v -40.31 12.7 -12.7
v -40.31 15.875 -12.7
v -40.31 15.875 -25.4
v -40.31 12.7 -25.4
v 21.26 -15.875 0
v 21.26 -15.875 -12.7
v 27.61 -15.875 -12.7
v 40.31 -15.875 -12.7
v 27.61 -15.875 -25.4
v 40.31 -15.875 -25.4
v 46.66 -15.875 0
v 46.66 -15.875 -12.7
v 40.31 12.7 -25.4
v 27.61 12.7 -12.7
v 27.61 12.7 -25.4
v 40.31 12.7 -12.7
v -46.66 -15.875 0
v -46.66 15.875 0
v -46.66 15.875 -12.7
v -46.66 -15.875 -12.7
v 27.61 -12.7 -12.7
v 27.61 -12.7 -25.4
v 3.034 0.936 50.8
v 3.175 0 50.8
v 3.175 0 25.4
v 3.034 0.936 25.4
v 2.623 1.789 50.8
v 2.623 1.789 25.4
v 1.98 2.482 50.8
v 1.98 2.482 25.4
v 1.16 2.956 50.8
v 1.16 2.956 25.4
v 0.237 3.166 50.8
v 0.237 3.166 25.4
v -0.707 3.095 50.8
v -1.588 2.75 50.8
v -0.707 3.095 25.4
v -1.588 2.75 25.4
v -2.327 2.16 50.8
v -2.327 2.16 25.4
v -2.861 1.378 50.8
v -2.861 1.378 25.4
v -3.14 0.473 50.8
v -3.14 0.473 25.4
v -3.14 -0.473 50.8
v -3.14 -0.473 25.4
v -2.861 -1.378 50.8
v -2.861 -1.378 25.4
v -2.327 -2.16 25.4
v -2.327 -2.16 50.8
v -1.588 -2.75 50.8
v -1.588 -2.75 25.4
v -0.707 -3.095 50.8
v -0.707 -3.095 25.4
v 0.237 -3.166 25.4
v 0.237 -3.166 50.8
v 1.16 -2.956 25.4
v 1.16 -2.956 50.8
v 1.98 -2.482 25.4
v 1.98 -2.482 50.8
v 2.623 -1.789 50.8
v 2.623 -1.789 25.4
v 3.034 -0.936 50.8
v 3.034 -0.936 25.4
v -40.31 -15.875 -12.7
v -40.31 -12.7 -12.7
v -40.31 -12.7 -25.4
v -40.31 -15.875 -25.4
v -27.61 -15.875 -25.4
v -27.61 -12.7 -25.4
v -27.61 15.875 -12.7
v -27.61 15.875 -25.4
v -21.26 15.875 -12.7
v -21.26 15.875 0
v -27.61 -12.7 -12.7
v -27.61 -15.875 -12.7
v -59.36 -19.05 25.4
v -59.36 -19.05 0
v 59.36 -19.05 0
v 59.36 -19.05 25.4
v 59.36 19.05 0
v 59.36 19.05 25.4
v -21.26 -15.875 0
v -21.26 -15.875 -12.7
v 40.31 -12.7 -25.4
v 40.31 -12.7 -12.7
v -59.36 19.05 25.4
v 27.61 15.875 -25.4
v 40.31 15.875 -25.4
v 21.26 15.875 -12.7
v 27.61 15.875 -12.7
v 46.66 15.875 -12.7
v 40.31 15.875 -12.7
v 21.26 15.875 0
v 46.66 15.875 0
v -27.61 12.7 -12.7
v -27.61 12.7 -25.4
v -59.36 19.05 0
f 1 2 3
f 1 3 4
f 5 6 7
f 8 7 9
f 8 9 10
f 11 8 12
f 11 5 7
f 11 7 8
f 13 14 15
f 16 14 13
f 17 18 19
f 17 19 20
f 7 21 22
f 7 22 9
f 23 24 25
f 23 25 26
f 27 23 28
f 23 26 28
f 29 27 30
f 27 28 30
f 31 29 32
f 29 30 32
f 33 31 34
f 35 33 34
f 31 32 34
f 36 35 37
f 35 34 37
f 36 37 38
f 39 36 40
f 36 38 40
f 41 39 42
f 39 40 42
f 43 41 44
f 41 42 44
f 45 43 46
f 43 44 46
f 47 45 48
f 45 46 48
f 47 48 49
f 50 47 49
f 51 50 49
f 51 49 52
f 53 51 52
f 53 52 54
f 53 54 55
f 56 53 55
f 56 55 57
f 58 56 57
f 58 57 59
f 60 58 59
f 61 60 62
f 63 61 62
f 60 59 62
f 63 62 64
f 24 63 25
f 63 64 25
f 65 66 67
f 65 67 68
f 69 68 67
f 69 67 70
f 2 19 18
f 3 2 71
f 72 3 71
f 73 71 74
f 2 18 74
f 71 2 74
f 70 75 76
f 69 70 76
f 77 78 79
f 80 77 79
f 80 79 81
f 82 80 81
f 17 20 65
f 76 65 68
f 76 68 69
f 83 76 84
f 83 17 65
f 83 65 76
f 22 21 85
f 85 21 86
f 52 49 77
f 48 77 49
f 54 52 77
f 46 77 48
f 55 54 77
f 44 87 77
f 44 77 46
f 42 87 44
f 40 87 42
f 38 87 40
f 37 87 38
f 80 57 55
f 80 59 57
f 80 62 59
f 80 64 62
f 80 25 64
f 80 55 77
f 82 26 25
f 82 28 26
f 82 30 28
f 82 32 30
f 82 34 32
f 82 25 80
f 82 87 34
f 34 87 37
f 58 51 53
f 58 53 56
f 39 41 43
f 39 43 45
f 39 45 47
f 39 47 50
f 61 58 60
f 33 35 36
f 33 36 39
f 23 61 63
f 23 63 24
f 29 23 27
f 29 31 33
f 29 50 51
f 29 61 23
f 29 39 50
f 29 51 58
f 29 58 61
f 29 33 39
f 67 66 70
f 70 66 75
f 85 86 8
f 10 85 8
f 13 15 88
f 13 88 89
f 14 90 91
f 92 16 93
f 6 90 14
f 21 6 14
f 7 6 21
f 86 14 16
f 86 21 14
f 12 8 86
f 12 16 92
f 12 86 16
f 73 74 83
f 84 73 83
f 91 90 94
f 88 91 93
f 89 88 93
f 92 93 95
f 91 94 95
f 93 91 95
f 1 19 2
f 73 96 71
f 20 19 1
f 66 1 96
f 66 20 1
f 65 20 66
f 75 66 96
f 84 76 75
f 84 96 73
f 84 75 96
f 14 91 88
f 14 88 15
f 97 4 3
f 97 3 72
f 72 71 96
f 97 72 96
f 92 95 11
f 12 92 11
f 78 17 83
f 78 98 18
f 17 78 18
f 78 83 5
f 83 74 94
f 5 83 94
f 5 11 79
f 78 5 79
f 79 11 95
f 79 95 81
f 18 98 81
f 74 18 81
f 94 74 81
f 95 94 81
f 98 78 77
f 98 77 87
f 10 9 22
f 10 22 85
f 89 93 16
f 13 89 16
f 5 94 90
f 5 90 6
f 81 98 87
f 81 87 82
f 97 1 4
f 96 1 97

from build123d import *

# Parameters (mm, degrees)
F0_W     = 118.7196
F0_H     = 38.1
F1_DEPTH = 25.4
F2_W     = 25.4
F2_H     = 31.75
F3_DEPTH = 12.7
F4_W     = 12.7
F4_H     = 3.175
F5_DEPTH = 12.7
F6_W     = 12.7
F6_H     = 3.175
F7_DEPTH = 12.7
F8_R     = 3.175
F9_DEPTH = 25.4


with BuildPart() as f1:
    # F0 (on Top) → F1 (new body)
    with BuildSketch(Plane.XY):
        Rectangle(F0_W, F0_H)
    extrude(amount=F1_DEPTH)

    # F2 (on face) → F3 (join)
    with BuildSketch(Plane(origin=(0, 0, 0), x_dir=(1, 0, 0), z_dir=(0, 0, -1))):
        with Locations((-33.9598, 0)):
            Rectangle(F2_W, F2_H)
        with Locations((33.9598, 0)):
            Rectangle(F2_W, F2_H)
    extrude(amount=F3_DEPTH)

    # F4 (on face) → F5 (join)
    with BuildSketch(Plane(origin=(0, 0, -12.7), x_dir=(1, 0, 0), z_dir=(0, 0, -1))):
        with Locations((-33.9598, 14.2875)):
            Rectangle(F4_W, F4_H)
        with Locations((-33.9598, -14.2875)):
            Rectangle(F4_W, F4_H)
    extrude(amount=F5_DEPTH)

    # F6 (on face) → F7 (join)
    with BuildSketch(Plane(origin=(0, 0, -12.7), x_dir=(1, 0, 0), z_dir=(0, 0, -1))):
        with Locations((33.9598, 14.2875)):
            Rectangle(F6_W, F6_H)
        with Locations((33.9598, -14.2875)):
            Rectangle(F6_W, F6_H)
    extrude(amount=F7_DEPTH)

    # F8 (on face) → F9 (join)
    with BuildSketch(Plane.XY.offset(25.4)):
        Circle(F8_R)
    extrude(amount=F9_DEPTH)


solid = f1.part
